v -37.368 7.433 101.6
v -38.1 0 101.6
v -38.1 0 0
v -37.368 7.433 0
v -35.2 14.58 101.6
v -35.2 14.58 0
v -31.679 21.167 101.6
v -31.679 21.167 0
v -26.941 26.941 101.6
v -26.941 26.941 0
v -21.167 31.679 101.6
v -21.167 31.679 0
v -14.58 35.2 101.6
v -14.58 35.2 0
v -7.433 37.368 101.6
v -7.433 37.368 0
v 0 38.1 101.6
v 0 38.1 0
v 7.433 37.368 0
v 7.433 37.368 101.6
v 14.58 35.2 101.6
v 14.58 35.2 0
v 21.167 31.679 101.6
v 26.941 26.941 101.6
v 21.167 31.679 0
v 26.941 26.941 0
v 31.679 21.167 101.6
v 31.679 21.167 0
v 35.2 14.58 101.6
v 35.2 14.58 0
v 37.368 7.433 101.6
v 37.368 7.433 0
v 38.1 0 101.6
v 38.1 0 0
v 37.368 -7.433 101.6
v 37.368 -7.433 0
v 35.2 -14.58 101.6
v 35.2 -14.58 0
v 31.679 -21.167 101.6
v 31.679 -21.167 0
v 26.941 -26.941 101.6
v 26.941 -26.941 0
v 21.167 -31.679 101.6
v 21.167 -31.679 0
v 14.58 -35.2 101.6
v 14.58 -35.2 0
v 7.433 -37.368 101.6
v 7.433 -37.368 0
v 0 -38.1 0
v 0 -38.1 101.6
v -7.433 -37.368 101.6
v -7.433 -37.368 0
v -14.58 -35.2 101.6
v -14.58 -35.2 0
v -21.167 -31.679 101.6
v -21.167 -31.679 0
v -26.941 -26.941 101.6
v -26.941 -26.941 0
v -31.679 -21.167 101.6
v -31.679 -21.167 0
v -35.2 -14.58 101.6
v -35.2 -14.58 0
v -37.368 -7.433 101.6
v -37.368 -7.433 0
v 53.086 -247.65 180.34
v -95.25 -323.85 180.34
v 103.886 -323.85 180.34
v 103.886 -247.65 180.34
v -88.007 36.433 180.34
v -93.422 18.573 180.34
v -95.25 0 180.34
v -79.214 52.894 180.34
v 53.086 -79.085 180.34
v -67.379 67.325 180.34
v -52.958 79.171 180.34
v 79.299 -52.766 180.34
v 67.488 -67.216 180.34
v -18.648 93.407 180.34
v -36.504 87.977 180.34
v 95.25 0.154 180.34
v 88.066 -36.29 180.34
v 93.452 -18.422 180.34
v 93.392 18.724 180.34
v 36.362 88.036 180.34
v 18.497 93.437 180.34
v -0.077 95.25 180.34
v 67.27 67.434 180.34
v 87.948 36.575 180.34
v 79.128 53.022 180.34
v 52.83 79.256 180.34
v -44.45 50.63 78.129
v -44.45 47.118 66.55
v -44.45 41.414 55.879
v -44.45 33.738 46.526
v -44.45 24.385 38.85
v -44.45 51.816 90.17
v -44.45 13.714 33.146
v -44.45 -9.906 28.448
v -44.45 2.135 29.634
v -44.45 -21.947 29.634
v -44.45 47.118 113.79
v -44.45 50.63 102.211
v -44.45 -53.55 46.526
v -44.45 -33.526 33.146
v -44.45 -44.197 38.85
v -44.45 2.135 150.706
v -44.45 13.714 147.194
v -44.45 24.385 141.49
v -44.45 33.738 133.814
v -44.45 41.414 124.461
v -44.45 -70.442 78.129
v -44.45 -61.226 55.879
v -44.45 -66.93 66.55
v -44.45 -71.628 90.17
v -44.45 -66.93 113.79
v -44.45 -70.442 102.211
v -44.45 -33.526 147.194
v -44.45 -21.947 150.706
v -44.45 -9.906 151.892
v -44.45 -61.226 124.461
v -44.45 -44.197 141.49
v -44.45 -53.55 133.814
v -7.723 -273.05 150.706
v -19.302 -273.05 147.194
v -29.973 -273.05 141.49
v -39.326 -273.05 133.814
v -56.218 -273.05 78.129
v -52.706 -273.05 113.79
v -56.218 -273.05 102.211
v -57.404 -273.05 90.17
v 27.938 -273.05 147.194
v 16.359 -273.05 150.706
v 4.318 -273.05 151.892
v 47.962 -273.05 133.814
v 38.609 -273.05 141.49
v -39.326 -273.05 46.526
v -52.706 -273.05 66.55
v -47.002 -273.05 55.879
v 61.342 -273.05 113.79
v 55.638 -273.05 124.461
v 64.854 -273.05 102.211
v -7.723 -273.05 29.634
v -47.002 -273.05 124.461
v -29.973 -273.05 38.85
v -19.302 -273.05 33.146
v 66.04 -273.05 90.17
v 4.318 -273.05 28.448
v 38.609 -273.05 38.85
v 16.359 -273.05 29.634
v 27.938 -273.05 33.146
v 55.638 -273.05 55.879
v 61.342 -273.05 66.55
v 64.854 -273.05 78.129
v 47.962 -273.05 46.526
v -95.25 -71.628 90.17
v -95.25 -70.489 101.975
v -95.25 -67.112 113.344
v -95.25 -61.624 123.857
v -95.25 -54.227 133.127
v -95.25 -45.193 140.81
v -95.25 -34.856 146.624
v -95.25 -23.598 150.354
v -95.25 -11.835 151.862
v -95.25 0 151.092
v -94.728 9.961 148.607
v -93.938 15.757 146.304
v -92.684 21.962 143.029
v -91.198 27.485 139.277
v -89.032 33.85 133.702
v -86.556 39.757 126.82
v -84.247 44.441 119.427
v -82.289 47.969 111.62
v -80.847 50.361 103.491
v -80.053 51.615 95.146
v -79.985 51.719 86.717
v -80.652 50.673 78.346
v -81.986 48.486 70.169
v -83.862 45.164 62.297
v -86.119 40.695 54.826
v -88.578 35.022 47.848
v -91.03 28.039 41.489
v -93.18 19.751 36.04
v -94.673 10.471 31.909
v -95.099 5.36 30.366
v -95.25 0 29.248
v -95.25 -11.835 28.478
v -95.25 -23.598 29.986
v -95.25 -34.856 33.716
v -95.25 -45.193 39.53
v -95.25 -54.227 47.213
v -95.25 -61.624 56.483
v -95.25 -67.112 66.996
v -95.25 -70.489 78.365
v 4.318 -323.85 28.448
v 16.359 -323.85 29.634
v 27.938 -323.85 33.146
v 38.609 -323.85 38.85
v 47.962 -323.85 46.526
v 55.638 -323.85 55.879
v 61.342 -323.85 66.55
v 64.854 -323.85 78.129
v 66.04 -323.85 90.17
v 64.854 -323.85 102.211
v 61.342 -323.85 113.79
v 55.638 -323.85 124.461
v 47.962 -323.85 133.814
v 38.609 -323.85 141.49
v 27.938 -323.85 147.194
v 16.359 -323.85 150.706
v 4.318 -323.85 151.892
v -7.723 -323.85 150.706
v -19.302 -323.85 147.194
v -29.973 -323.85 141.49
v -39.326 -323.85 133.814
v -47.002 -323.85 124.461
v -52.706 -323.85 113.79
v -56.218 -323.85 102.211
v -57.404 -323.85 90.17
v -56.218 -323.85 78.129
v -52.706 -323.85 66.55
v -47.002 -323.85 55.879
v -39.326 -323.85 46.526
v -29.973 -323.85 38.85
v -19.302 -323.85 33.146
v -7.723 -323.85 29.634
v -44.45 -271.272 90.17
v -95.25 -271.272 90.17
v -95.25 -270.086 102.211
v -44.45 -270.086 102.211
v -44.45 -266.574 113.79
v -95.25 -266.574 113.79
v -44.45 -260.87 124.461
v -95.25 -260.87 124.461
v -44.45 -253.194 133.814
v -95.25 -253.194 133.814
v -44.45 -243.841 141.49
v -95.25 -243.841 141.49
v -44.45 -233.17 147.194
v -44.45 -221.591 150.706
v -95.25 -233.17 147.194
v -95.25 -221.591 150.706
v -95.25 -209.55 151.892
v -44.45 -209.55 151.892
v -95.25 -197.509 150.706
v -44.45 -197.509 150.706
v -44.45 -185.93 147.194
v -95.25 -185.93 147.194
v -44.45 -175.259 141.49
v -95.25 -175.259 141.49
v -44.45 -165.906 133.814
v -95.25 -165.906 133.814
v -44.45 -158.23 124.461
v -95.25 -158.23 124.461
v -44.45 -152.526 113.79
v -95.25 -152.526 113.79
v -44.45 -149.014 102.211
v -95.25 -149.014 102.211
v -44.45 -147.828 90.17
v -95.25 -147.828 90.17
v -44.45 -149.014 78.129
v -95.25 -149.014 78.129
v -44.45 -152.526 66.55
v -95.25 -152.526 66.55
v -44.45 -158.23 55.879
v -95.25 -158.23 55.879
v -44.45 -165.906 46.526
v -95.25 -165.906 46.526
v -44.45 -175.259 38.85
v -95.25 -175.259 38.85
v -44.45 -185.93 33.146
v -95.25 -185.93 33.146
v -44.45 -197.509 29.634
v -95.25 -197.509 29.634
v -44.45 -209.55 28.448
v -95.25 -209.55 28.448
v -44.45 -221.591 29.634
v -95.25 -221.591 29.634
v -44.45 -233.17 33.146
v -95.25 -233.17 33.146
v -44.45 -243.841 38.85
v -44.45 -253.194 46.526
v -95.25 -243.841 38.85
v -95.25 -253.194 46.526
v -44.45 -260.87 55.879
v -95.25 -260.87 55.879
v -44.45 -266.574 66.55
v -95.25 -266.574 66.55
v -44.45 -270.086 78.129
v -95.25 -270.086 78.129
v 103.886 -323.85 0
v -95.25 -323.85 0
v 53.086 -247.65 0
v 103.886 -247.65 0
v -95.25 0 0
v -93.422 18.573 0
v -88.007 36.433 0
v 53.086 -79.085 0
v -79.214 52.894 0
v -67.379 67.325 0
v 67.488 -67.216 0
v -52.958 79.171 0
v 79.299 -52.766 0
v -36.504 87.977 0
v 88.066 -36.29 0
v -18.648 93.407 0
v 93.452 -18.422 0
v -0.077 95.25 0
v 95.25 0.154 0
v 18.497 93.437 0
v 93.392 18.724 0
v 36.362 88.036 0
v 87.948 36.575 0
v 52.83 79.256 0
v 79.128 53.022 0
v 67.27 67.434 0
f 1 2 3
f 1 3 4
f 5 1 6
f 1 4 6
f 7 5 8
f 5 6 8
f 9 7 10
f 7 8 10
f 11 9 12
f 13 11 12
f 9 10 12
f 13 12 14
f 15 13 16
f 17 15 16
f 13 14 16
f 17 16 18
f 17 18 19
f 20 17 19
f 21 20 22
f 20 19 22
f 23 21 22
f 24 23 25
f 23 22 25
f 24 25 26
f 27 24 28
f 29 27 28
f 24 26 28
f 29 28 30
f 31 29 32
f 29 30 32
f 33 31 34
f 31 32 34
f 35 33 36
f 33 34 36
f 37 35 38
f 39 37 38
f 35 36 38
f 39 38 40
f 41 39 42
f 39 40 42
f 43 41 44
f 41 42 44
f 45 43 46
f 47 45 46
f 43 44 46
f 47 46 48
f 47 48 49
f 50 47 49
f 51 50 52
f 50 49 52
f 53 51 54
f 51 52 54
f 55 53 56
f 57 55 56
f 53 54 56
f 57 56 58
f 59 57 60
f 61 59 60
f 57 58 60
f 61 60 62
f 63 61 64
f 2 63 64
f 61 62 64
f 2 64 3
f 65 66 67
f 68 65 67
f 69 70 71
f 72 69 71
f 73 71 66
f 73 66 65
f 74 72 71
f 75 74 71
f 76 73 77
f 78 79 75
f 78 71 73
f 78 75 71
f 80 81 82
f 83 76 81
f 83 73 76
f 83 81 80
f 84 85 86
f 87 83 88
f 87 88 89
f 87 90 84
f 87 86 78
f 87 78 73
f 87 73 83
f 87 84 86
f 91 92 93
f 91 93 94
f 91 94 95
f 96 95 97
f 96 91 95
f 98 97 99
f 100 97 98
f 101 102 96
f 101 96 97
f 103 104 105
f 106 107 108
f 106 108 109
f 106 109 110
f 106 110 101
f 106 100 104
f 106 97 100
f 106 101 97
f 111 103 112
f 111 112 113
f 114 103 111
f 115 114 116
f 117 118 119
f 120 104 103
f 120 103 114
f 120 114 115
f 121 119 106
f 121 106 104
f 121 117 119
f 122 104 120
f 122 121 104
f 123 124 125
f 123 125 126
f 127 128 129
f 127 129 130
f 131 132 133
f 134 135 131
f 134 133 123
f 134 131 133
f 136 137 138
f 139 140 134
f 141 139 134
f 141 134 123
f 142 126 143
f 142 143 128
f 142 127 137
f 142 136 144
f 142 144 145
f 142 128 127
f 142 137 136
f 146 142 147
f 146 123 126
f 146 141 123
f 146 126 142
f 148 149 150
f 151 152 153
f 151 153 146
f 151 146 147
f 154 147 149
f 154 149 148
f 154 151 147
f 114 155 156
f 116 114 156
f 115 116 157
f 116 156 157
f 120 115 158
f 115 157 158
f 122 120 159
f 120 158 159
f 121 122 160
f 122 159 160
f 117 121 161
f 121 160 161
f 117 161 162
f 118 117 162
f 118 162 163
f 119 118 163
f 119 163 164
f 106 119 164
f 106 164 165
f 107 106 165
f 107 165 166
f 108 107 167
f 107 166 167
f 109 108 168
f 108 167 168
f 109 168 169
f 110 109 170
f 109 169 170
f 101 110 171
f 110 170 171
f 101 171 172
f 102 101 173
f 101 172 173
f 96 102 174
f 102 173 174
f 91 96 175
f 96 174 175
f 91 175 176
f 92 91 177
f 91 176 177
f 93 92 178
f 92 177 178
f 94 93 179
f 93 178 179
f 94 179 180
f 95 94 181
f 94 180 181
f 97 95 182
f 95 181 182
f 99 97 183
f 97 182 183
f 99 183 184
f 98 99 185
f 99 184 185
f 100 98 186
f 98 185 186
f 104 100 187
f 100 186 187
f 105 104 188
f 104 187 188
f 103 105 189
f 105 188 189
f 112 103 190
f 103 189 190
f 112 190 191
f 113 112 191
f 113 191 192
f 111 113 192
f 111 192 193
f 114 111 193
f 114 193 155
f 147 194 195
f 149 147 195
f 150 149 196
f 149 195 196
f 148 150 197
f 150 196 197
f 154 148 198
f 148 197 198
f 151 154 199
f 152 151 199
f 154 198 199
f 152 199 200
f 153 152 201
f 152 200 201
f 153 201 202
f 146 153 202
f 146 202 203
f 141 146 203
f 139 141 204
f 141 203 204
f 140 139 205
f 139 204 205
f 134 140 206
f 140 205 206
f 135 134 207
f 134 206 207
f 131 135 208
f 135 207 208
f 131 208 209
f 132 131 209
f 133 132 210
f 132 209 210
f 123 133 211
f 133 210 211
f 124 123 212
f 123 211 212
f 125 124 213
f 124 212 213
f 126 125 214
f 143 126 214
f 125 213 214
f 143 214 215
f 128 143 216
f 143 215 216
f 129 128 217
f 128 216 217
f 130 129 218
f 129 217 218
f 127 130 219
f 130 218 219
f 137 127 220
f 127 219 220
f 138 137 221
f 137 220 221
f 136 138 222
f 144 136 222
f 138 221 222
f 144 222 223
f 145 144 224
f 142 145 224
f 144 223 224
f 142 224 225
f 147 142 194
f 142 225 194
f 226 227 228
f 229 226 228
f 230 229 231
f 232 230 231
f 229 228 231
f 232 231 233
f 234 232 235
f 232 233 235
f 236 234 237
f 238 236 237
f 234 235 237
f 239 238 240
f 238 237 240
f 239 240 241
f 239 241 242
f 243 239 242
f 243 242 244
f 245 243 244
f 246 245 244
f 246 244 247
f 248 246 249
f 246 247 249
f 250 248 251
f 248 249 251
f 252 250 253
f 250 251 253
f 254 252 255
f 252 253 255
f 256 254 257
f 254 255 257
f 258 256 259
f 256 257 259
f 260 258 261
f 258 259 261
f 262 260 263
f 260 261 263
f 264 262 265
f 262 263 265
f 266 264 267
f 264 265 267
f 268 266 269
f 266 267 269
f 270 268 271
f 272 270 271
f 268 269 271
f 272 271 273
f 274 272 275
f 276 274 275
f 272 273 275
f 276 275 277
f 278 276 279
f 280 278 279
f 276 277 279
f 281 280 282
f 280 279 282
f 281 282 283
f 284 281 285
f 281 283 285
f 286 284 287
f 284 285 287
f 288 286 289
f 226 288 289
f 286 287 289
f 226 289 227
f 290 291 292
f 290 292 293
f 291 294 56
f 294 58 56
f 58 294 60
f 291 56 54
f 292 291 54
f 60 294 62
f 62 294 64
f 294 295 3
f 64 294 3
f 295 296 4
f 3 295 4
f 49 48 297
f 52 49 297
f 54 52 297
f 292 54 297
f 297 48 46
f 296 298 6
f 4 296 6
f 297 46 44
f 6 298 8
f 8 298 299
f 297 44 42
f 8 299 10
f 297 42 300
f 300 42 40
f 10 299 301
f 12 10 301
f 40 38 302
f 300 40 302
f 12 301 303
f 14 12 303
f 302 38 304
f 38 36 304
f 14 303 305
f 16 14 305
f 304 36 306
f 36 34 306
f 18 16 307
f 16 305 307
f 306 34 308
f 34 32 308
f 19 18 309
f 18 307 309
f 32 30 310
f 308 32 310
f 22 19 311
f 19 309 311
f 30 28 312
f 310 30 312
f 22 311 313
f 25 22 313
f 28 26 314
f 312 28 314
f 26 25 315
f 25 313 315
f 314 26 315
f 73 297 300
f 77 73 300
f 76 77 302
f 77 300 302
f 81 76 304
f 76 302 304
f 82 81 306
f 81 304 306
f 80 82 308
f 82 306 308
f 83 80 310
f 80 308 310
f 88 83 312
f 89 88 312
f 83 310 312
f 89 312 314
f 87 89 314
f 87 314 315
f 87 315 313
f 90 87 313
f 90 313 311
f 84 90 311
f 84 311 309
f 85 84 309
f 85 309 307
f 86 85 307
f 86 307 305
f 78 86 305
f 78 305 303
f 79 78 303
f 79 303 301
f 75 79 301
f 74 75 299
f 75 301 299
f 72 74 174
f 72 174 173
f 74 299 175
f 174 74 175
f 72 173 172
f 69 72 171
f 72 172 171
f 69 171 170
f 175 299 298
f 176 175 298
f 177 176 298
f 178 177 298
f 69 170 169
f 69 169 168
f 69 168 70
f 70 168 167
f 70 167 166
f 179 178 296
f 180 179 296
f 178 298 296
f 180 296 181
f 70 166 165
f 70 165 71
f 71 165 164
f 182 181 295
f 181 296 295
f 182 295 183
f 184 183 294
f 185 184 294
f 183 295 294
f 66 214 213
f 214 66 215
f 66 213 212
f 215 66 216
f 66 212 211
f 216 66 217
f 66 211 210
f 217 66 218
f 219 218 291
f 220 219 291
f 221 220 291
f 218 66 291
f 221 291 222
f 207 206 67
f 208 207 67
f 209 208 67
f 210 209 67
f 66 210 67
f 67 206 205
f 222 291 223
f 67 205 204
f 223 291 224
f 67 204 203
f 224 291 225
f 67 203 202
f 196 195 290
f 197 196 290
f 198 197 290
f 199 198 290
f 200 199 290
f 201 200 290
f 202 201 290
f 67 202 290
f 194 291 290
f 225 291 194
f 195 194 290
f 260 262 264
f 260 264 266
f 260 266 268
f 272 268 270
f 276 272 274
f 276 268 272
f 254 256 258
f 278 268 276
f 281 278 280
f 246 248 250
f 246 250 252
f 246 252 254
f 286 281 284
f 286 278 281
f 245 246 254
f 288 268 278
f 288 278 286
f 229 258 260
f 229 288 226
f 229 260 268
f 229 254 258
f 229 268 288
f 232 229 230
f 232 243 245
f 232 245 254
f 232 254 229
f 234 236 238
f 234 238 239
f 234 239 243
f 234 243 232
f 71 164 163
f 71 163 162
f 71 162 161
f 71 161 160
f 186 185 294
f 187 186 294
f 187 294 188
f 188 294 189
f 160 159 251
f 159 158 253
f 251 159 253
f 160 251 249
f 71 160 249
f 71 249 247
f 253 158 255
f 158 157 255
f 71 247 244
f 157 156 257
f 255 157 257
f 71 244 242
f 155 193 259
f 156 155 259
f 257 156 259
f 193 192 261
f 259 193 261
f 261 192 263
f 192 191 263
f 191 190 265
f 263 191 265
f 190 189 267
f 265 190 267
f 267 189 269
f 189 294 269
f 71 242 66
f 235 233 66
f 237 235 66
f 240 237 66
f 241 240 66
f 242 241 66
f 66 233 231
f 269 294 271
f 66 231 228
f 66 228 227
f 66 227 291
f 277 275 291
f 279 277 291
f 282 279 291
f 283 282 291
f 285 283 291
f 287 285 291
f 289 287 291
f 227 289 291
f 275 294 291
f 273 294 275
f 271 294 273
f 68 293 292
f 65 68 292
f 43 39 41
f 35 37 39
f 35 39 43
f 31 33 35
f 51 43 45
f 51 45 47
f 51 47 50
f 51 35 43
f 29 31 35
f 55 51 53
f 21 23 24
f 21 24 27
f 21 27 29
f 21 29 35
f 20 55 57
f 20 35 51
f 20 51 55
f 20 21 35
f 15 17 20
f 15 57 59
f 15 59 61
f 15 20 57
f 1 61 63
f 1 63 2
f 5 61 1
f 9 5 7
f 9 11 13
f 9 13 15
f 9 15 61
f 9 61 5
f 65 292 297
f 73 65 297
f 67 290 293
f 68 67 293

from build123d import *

# Parameters (mm, degrees)
BOSS_EXTRUDE1_DEPTH = 180.34
SKETCH2_R           = 38.1
CUT_EXTRUDE1_DEPTH  = 101.6
SKETCH3_R           = 61.722
CUT_EXTRUDE2_DEPTH  = 50.8
SKETCH4_R           = 61.722
CUT_EXTRUDE3_DEPTH  = 50.8


with BuildPart() as part:
    # Sketch1 → Boss-Extrude1 (new body)
    with BuildSketch(Plane.XY):
        with BuildLine():
            Line((-95.25, 0), (-95.25, -323.85))
            Line((-95.25, -323.85), (103.886, -323.85))
            Line((103.886, -323.85), (103.886, -247.65))
            Line((103.886, -247.65), (53.086, -247.65))
            Line((53.086, -247.65), (53.086, -79.08501188))
            ThreePointArc((53.086, -79.08501188), (44.811388062, 84.050591907), (-95.25, 0))
        make_face()
    extrude(amount=BOSS_EXTRUDE1_DEPTH)

    # Sketch2 → Cut-Extrude1 (cut)
    with BuildSketch(Plane(origin=(0, 0, 0), x_dir=(-1, 0, 0), z_dir=(0, 0, -1))):
        Circle(SKETCH2_R)
    extrude(amount=-CUT_EXTRUDE1_DEPTH, mode=Mode.SUBTRACT)

    # Sketch3 → Cut-Extrude2 (cut)
    with BuildSketch(Plane.XZ.offset(323.85)):
        with Locations(Location((4.318, 90.17, 0), (0, 0, 270))):
            Circle(SKETCH3_R)
    extrude(amount=-CUT_EXTRUDE2_DEPTH, mode=Mode.SUBTRACT)

    # Sketch4 → Cut-Extrude3 (cut)
    with BuildSketch(Plane.ZY.offset(95.25)):
        with Locations(Location((90.17, -209.55, 0), (0, 0, 270))):
            Circle(SKETCH4_R)
        with Locations(Location((90.17, -9.906, 0), (0, 0, 270))):
            Circle(SKETCH4_R)
    extrude(amount=-CUT_EXTRUDE3_DEPTH, mode=Mode.SUBTRACT)


solid = part.part
